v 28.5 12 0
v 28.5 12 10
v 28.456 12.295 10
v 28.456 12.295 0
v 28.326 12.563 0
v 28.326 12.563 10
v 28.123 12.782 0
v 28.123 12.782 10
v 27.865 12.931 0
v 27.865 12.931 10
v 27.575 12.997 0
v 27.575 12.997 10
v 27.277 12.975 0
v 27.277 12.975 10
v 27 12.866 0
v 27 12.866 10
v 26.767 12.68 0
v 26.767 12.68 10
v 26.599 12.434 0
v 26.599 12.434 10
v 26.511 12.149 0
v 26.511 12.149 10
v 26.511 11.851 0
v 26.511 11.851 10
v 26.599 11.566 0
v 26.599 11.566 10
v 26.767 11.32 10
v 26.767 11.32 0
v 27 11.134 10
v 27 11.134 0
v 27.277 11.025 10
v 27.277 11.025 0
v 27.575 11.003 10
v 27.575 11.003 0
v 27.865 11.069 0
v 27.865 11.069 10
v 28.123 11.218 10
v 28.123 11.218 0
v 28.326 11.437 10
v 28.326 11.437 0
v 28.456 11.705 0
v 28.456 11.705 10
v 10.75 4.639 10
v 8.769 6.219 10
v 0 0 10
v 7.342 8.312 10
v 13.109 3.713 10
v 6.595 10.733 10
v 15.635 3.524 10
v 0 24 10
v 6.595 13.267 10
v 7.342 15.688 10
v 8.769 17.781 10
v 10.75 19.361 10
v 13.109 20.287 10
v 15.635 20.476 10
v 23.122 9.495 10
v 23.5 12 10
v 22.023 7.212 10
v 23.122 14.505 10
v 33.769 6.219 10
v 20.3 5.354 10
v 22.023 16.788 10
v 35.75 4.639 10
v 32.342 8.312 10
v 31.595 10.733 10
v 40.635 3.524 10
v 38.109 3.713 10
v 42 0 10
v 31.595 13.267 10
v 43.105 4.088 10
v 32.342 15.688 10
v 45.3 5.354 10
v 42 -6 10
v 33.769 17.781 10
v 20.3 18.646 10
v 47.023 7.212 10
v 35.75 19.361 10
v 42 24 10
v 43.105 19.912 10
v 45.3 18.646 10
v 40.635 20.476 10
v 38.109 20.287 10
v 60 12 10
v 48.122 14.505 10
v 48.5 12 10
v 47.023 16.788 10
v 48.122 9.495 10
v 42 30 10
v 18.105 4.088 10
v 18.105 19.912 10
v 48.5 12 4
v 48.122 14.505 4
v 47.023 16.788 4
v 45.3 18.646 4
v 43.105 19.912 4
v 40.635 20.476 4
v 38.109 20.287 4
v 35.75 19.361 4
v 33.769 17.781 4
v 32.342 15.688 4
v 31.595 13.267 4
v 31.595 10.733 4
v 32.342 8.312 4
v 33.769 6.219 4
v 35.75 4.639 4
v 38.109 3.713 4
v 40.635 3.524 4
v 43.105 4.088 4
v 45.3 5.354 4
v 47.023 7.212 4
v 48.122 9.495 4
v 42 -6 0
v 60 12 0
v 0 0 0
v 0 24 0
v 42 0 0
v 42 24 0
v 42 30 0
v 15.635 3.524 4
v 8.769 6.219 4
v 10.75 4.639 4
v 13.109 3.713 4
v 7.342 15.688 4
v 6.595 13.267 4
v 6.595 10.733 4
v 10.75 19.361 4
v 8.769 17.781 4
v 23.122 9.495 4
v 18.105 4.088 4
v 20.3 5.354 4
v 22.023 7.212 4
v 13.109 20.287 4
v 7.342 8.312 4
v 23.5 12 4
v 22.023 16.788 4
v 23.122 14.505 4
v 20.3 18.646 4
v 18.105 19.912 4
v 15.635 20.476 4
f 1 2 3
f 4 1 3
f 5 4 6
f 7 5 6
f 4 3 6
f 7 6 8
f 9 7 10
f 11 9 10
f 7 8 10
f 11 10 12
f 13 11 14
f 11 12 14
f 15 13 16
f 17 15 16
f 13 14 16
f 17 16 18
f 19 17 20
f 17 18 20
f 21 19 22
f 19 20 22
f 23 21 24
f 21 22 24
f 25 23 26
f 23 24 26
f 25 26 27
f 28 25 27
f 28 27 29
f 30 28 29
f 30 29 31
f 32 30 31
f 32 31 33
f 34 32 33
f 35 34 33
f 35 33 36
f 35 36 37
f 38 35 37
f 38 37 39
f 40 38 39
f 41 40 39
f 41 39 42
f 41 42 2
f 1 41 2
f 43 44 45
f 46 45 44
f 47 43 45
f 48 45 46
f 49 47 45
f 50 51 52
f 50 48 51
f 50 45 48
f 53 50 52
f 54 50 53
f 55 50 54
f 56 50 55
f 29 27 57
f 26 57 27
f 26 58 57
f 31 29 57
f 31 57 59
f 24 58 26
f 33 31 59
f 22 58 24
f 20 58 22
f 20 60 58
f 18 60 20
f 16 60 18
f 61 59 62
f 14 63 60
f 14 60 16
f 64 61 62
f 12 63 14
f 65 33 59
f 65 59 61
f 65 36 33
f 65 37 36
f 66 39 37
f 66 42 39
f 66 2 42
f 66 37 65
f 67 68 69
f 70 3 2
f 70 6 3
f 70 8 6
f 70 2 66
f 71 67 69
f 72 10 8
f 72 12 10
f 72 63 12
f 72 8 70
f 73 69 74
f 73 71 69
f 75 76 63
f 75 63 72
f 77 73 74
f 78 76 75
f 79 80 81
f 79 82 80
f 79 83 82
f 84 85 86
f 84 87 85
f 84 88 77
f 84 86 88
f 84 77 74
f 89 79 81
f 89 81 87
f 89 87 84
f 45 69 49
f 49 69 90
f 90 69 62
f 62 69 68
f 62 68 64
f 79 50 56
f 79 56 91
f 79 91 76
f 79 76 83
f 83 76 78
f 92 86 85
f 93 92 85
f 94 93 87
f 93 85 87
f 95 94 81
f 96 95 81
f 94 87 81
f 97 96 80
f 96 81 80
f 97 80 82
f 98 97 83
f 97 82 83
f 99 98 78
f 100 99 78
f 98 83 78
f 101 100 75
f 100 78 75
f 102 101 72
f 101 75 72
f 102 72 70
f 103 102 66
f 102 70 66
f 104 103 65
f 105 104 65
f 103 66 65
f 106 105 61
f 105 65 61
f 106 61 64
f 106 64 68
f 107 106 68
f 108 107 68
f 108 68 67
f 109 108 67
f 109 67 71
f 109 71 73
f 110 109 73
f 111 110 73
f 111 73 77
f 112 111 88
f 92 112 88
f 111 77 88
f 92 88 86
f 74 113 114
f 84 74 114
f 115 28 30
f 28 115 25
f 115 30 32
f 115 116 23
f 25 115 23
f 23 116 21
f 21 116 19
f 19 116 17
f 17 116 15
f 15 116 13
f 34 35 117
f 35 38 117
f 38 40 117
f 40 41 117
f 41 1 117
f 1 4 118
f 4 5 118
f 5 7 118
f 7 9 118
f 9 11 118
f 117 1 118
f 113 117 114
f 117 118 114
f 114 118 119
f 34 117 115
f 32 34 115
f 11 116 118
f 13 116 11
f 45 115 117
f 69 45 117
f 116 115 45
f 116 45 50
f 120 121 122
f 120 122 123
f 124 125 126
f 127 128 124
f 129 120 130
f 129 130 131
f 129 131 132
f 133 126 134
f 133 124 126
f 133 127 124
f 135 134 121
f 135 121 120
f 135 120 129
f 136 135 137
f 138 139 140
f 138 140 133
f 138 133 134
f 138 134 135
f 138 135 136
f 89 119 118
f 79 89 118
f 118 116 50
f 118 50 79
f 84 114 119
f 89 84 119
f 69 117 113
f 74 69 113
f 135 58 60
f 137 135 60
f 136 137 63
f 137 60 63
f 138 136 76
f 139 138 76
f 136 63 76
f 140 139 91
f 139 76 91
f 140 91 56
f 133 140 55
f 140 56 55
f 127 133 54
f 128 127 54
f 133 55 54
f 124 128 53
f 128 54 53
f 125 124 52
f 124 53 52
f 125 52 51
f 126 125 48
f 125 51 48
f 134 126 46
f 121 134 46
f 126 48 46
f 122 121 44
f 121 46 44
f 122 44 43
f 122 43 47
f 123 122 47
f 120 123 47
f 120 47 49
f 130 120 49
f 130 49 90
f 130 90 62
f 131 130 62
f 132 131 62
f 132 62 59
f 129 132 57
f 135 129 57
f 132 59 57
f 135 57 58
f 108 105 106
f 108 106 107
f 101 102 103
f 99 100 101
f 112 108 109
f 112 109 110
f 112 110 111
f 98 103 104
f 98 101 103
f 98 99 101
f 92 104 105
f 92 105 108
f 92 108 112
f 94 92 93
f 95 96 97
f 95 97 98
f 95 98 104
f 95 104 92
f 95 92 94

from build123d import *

# Parameters (mm, degrees)
F0_W     = 42
F0_H     = 24
F1_DEPTH = 10
F2_R     = 8.5
F3_DEPTH = 6
F4_R     = 1
F5_DEPTH = 25


with BuildPart() as f1:
    # F0 (on Top) → F1 (new body)
    with BuildSketch(Plane.XY):
        with Locations((21, 12)):
            Rectangle(F0_W, F0_H)
        Polygon((42, 24), (42, 0), (42, -6), (60, 12), (42, 30), align=None)
    extrude(amount=F1_DEPTH)

    # F2 (on face) → F3 (cut)
    with BuildSketch(Plane.XY.offset(10)):
        with Locations((15, 12)):
            Circle(F2_R)
        with Locations((40, 12)):
            Circle(F2_R)
    extrude(amount=-F3_DEPTH, mode=Mode.SUBTRACT)

    # F4 (on face) → F5 (cut)
    with BuildSketch(Plane.XY.offset(10)):
        with Locations((27.5, 12)):
            Circle(F4_R)
    extrude(amount=-F5_DEPTH, mode=Mode.SUBTRACT)


solid = f1.part
